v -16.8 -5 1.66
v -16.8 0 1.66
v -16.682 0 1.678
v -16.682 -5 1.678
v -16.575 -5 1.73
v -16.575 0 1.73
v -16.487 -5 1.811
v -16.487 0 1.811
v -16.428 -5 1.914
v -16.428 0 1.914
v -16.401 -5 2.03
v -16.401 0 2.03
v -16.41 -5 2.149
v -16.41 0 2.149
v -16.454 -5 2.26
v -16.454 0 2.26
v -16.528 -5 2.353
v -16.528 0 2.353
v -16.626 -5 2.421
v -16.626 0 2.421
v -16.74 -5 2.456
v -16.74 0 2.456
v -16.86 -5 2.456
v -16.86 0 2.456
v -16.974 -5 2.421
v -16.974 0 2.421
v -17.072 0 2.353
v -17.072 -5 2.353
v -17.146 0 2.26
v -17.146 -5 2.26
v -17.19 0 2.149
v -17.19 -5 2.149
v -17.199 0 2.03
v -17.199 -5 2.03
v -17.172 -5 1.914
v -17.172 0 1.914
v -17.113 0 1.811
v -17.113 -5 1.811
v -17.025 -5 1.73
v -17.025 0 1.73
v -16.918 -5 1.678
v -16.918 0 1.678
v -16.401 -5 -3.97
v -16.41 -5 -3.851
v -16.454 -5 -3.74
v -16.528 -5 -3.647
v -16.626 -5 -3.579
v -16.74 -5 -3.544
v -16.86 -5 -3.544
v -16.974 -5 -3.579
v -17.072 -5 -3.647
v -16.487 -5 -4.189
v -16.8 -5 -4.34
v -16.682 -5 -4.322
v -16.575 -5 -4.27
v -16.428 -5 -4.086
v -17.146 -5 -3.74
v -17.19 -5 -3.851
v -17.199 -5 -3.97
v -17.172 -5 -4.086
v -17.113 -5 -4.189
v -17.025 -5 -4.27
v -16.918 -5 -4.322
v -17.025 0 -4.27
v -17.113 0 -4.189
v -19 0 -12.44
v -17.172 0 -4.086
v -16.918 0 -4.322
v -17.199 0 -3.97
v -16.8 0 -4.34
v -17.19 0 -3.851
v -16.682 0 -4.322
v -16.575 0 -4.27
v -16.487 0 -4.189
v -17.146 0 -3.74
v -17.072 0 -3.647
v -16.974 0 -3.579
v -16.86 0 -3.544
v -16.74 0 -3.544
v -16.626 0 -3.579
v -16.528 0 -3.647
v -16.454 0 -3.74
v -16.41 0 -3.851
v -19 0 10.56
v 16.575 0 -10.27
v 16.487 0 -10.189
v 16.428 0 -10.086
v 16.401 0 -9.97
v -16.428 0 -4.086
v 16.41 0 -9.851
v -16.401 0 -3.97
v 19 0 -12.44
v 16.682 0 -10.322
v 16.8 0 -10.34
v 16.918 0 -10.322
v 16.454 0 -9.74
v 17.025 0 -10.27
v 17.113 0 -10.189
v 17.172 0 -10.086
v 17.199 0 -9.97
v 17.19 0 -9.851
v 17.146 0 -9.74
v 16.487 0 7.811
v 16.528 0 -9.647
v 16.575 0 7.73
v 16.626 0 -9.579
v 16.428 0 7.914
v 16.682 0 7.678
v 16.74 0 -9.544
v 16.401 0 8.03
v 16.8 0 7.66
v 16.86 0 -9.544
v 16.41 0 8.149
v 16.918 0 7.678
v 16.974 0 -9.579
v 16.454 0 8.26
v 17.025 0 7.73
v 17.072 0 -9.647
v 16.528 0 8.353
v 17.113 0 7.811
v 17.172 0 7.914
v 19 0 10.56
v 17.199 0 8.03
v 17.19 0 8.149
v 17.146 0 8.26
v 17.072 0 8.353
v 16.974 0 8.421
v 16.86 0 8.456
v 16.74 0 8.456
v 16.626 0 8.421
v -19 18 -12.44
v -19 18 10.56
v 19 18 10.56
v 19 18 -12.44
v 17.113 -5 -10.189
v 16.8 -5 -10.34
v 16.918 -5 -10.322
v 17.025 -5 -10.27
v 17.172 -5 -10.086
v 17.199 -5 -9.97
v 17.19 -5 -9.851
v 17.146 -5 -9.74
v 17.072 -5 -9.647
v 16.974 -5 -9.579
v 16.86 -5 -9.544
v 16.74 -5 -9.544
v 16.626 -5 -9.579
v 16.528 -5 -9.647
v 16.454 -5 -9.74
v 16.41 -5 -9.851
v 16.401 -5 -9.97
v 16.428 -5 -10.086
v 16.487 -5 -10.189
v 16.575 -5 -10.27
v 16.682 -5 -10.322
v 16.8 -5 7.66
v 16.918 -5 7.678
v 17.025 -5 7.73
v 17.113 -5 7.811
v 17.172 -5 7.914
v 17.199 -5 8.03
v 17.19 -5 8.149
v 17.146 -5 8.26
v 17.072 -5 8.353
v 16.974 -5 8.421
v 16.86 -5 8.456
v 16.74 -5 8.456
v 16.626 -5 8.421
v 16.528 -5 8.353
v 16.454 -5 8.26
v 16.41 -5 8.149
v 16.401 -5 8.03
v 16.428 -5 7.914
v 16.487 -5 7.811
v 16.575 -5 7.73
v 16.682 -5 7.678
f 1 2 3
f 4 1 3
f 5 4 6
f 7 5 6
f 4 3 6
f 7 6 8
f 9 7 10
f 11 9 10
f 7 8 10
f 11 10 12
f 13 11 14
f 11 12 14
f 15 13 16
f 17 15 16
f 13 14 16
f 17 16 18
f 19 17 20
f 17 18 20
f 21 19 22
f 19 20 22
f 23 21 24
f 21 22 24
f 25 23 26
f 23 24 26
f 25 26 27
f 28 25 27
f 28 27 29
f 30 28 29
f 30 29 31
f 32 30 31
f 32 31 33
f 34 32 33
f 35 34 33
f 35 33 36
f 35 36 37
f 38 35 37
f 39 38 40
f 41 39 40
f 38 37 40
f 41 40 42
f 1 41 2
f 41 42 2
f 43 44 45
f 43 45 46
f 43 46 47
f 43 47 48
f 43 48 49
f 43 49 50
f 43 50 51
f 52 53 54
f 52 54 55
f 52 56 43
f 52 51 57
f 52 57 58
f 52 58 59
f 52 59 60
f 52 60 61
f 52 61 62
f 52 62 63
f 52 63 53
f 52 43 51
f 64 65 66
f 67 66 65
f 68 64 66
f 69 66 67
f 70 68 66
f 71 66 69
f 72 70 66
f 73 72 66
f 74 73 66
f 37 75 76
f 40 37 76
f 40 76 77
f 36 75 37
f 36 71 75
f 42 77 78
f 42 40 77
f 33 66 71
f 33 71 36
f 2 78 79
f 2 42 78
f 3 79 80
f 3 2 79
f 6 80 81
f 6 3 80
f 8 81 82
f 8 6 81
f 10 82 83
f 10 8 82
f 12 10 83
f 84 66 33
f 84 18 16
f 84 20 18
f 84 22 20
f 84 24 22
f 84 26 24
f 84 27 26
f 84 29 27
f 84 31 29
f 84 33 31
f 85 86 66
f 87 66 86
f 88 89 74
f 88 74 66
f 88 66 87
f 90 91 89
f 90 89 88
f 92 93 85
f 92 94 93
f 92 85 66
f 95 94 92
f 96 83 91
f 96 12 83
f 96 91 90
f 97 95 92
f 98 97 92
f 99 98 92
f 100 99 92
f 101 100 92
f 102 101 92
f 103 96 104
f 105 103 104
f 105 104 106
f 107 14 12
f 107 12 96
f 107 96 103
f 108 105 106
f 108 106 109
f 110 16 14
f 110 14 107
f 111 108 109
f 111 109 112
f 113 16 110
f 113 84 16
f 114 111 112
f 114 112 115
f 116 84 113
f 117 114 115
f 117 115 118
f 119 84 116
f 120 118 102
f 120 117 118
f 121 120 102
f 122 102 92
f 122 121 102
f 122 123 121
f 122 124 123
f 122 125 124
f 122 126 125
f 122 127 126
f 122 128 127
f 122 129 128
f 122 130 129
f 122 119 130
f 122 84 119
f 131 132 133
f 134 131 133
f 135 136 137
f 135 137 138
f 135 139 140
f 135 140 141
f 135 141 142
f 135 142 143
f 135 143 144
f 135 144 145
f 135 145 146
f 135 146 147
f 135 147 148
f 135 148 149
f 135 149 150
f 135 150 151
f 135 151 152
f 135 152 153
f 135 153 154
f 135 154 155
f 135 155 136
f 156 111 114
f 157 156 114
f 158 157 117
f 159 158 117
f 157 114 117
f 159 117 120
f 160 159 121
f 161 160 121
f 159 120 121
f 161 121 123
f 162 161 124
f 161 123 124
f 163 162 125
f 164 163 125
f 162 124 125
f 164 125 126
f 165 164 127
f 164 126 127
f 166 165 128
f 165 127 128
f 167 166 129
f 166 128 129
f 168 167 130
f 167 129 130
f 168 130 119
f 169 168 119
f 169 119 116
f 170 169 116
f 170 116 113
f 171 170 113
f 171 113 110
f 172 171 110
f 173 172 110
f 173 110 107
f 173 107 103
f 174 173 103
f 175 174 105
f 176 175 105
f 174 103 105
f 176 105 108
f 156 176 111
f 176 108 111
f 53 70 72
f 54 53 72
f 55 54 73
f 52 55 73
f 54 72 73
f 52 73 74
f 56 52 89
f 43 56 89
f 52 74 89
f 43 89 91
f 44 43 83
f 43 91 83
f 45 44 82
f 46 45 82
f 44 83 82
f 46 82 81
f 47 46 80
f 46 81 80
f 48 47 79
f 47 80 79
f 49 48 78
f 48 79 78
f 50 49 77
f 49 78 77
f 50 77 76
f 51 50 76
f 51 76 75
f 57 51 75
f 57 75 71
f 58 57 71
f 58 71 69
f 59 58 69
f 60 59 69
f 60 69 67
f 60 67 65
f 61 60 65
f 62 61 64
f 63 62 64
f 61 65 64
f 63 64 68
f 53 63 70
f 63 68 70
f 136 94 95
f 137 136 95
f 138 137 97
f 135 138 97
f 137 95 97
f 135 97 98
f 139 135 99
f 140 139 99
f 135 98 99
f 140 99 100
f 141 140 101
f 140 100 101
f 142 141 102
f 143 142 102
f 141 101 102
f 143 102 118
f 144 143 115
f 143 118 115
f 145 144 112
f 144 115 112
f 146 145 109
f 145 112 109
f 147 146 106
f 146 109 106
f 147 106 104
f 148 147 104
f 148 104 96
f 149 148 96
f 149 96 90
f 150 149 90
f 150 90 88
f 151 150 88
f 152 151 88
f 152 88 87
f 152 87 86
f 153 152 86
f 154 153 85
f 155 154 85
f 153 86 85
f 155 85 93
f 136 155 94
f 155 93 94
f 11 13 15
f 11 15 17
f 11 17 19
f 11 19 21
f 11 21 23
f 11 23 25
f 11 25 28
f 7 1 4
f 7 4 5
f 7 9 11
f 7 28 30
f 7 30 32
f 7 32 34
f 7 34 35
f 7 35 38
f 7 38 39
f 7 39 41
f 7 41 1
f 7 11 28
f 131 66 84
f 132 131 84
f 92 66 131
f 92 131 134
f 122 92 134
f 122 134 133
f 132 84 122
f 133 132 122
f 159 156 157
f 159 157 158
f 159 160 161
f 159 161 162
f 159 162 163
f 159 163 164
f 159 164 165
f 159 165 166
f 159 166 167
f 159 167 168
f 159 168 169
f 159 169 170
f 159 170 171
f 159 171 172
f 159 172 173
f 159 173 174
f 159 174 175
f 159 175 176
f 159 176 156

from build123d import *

# Parameters (mm, degrees)
SKETCH1_W           = 38
SKETCH1_H           = 23
BOSS_EXTRUDE1_DEPTH = 18
SKETCH3_R           = 0.4
BOSS_EXTRUDE3_DEPTH = 5
SKETCH4_R           = 0.4
BOSS_EXTRUDE4_DEPTH = 5
SKETCH5_R           = 0.4
BOSS_EXTRUDE5_DEPTH = 5
SKETCH6_R           = 0.4
BOSS_EXTRUDE6_DEPTH = 5


with BuildPart() as part:
    # Sketch1 → Boss-Extrude1 (new body)
    with BuildSketch(Plane.XZ):
        with Locations((0, -0.939824945)):
            Rectangle(SKETCH1_W, SKETCH1_H)
    extrude(amount=-BOSS_EXTRUDE1_DEPTH)

    # Sketch3 → Boss-Extrude3 (add)
    with BuildSketch(Plane.XZ):
        with Locations(Location((16.8, -9.939824945, 0), (0, 0, 270))):
            Circle(SKETCH3_R)
    extrude(amount=BOSS_EXTRUDE3_DEPTH)

    # Sketch4 → Boss-Extrude4 (add)
    with BuildSketch(Plane.XZ):
        with Locations(Location((-16.8, -3.939824945, 0), (0, 0, 270))):
            Circle(SKETCH4_R)
    extrude(amount=BOSS_EXTRUDE4_DEPTH)

    # Sketch5 → Boss-Extrude5 (add)
    with BuildSketch(Plane.XZ):
        with Locations(Location((16.8, 8.060175055, 0), (0, 0, 270))):
            Circle(SKETCH5_R)
    extrude(amount=BOSS_EXTRUDE5_DEPTH)

    # Sketch6 → Boss-Extrude6 (add)
    with BuildSketch(Plane.XZ):
        with Locations(Location((-16.8, 2.060175055, 0), (0, 0, 270))):
            Circle(SKETCH6_R)
    extrude(amount=BOSS_EXTRUDE6_DEPTH)


solid = part.part
